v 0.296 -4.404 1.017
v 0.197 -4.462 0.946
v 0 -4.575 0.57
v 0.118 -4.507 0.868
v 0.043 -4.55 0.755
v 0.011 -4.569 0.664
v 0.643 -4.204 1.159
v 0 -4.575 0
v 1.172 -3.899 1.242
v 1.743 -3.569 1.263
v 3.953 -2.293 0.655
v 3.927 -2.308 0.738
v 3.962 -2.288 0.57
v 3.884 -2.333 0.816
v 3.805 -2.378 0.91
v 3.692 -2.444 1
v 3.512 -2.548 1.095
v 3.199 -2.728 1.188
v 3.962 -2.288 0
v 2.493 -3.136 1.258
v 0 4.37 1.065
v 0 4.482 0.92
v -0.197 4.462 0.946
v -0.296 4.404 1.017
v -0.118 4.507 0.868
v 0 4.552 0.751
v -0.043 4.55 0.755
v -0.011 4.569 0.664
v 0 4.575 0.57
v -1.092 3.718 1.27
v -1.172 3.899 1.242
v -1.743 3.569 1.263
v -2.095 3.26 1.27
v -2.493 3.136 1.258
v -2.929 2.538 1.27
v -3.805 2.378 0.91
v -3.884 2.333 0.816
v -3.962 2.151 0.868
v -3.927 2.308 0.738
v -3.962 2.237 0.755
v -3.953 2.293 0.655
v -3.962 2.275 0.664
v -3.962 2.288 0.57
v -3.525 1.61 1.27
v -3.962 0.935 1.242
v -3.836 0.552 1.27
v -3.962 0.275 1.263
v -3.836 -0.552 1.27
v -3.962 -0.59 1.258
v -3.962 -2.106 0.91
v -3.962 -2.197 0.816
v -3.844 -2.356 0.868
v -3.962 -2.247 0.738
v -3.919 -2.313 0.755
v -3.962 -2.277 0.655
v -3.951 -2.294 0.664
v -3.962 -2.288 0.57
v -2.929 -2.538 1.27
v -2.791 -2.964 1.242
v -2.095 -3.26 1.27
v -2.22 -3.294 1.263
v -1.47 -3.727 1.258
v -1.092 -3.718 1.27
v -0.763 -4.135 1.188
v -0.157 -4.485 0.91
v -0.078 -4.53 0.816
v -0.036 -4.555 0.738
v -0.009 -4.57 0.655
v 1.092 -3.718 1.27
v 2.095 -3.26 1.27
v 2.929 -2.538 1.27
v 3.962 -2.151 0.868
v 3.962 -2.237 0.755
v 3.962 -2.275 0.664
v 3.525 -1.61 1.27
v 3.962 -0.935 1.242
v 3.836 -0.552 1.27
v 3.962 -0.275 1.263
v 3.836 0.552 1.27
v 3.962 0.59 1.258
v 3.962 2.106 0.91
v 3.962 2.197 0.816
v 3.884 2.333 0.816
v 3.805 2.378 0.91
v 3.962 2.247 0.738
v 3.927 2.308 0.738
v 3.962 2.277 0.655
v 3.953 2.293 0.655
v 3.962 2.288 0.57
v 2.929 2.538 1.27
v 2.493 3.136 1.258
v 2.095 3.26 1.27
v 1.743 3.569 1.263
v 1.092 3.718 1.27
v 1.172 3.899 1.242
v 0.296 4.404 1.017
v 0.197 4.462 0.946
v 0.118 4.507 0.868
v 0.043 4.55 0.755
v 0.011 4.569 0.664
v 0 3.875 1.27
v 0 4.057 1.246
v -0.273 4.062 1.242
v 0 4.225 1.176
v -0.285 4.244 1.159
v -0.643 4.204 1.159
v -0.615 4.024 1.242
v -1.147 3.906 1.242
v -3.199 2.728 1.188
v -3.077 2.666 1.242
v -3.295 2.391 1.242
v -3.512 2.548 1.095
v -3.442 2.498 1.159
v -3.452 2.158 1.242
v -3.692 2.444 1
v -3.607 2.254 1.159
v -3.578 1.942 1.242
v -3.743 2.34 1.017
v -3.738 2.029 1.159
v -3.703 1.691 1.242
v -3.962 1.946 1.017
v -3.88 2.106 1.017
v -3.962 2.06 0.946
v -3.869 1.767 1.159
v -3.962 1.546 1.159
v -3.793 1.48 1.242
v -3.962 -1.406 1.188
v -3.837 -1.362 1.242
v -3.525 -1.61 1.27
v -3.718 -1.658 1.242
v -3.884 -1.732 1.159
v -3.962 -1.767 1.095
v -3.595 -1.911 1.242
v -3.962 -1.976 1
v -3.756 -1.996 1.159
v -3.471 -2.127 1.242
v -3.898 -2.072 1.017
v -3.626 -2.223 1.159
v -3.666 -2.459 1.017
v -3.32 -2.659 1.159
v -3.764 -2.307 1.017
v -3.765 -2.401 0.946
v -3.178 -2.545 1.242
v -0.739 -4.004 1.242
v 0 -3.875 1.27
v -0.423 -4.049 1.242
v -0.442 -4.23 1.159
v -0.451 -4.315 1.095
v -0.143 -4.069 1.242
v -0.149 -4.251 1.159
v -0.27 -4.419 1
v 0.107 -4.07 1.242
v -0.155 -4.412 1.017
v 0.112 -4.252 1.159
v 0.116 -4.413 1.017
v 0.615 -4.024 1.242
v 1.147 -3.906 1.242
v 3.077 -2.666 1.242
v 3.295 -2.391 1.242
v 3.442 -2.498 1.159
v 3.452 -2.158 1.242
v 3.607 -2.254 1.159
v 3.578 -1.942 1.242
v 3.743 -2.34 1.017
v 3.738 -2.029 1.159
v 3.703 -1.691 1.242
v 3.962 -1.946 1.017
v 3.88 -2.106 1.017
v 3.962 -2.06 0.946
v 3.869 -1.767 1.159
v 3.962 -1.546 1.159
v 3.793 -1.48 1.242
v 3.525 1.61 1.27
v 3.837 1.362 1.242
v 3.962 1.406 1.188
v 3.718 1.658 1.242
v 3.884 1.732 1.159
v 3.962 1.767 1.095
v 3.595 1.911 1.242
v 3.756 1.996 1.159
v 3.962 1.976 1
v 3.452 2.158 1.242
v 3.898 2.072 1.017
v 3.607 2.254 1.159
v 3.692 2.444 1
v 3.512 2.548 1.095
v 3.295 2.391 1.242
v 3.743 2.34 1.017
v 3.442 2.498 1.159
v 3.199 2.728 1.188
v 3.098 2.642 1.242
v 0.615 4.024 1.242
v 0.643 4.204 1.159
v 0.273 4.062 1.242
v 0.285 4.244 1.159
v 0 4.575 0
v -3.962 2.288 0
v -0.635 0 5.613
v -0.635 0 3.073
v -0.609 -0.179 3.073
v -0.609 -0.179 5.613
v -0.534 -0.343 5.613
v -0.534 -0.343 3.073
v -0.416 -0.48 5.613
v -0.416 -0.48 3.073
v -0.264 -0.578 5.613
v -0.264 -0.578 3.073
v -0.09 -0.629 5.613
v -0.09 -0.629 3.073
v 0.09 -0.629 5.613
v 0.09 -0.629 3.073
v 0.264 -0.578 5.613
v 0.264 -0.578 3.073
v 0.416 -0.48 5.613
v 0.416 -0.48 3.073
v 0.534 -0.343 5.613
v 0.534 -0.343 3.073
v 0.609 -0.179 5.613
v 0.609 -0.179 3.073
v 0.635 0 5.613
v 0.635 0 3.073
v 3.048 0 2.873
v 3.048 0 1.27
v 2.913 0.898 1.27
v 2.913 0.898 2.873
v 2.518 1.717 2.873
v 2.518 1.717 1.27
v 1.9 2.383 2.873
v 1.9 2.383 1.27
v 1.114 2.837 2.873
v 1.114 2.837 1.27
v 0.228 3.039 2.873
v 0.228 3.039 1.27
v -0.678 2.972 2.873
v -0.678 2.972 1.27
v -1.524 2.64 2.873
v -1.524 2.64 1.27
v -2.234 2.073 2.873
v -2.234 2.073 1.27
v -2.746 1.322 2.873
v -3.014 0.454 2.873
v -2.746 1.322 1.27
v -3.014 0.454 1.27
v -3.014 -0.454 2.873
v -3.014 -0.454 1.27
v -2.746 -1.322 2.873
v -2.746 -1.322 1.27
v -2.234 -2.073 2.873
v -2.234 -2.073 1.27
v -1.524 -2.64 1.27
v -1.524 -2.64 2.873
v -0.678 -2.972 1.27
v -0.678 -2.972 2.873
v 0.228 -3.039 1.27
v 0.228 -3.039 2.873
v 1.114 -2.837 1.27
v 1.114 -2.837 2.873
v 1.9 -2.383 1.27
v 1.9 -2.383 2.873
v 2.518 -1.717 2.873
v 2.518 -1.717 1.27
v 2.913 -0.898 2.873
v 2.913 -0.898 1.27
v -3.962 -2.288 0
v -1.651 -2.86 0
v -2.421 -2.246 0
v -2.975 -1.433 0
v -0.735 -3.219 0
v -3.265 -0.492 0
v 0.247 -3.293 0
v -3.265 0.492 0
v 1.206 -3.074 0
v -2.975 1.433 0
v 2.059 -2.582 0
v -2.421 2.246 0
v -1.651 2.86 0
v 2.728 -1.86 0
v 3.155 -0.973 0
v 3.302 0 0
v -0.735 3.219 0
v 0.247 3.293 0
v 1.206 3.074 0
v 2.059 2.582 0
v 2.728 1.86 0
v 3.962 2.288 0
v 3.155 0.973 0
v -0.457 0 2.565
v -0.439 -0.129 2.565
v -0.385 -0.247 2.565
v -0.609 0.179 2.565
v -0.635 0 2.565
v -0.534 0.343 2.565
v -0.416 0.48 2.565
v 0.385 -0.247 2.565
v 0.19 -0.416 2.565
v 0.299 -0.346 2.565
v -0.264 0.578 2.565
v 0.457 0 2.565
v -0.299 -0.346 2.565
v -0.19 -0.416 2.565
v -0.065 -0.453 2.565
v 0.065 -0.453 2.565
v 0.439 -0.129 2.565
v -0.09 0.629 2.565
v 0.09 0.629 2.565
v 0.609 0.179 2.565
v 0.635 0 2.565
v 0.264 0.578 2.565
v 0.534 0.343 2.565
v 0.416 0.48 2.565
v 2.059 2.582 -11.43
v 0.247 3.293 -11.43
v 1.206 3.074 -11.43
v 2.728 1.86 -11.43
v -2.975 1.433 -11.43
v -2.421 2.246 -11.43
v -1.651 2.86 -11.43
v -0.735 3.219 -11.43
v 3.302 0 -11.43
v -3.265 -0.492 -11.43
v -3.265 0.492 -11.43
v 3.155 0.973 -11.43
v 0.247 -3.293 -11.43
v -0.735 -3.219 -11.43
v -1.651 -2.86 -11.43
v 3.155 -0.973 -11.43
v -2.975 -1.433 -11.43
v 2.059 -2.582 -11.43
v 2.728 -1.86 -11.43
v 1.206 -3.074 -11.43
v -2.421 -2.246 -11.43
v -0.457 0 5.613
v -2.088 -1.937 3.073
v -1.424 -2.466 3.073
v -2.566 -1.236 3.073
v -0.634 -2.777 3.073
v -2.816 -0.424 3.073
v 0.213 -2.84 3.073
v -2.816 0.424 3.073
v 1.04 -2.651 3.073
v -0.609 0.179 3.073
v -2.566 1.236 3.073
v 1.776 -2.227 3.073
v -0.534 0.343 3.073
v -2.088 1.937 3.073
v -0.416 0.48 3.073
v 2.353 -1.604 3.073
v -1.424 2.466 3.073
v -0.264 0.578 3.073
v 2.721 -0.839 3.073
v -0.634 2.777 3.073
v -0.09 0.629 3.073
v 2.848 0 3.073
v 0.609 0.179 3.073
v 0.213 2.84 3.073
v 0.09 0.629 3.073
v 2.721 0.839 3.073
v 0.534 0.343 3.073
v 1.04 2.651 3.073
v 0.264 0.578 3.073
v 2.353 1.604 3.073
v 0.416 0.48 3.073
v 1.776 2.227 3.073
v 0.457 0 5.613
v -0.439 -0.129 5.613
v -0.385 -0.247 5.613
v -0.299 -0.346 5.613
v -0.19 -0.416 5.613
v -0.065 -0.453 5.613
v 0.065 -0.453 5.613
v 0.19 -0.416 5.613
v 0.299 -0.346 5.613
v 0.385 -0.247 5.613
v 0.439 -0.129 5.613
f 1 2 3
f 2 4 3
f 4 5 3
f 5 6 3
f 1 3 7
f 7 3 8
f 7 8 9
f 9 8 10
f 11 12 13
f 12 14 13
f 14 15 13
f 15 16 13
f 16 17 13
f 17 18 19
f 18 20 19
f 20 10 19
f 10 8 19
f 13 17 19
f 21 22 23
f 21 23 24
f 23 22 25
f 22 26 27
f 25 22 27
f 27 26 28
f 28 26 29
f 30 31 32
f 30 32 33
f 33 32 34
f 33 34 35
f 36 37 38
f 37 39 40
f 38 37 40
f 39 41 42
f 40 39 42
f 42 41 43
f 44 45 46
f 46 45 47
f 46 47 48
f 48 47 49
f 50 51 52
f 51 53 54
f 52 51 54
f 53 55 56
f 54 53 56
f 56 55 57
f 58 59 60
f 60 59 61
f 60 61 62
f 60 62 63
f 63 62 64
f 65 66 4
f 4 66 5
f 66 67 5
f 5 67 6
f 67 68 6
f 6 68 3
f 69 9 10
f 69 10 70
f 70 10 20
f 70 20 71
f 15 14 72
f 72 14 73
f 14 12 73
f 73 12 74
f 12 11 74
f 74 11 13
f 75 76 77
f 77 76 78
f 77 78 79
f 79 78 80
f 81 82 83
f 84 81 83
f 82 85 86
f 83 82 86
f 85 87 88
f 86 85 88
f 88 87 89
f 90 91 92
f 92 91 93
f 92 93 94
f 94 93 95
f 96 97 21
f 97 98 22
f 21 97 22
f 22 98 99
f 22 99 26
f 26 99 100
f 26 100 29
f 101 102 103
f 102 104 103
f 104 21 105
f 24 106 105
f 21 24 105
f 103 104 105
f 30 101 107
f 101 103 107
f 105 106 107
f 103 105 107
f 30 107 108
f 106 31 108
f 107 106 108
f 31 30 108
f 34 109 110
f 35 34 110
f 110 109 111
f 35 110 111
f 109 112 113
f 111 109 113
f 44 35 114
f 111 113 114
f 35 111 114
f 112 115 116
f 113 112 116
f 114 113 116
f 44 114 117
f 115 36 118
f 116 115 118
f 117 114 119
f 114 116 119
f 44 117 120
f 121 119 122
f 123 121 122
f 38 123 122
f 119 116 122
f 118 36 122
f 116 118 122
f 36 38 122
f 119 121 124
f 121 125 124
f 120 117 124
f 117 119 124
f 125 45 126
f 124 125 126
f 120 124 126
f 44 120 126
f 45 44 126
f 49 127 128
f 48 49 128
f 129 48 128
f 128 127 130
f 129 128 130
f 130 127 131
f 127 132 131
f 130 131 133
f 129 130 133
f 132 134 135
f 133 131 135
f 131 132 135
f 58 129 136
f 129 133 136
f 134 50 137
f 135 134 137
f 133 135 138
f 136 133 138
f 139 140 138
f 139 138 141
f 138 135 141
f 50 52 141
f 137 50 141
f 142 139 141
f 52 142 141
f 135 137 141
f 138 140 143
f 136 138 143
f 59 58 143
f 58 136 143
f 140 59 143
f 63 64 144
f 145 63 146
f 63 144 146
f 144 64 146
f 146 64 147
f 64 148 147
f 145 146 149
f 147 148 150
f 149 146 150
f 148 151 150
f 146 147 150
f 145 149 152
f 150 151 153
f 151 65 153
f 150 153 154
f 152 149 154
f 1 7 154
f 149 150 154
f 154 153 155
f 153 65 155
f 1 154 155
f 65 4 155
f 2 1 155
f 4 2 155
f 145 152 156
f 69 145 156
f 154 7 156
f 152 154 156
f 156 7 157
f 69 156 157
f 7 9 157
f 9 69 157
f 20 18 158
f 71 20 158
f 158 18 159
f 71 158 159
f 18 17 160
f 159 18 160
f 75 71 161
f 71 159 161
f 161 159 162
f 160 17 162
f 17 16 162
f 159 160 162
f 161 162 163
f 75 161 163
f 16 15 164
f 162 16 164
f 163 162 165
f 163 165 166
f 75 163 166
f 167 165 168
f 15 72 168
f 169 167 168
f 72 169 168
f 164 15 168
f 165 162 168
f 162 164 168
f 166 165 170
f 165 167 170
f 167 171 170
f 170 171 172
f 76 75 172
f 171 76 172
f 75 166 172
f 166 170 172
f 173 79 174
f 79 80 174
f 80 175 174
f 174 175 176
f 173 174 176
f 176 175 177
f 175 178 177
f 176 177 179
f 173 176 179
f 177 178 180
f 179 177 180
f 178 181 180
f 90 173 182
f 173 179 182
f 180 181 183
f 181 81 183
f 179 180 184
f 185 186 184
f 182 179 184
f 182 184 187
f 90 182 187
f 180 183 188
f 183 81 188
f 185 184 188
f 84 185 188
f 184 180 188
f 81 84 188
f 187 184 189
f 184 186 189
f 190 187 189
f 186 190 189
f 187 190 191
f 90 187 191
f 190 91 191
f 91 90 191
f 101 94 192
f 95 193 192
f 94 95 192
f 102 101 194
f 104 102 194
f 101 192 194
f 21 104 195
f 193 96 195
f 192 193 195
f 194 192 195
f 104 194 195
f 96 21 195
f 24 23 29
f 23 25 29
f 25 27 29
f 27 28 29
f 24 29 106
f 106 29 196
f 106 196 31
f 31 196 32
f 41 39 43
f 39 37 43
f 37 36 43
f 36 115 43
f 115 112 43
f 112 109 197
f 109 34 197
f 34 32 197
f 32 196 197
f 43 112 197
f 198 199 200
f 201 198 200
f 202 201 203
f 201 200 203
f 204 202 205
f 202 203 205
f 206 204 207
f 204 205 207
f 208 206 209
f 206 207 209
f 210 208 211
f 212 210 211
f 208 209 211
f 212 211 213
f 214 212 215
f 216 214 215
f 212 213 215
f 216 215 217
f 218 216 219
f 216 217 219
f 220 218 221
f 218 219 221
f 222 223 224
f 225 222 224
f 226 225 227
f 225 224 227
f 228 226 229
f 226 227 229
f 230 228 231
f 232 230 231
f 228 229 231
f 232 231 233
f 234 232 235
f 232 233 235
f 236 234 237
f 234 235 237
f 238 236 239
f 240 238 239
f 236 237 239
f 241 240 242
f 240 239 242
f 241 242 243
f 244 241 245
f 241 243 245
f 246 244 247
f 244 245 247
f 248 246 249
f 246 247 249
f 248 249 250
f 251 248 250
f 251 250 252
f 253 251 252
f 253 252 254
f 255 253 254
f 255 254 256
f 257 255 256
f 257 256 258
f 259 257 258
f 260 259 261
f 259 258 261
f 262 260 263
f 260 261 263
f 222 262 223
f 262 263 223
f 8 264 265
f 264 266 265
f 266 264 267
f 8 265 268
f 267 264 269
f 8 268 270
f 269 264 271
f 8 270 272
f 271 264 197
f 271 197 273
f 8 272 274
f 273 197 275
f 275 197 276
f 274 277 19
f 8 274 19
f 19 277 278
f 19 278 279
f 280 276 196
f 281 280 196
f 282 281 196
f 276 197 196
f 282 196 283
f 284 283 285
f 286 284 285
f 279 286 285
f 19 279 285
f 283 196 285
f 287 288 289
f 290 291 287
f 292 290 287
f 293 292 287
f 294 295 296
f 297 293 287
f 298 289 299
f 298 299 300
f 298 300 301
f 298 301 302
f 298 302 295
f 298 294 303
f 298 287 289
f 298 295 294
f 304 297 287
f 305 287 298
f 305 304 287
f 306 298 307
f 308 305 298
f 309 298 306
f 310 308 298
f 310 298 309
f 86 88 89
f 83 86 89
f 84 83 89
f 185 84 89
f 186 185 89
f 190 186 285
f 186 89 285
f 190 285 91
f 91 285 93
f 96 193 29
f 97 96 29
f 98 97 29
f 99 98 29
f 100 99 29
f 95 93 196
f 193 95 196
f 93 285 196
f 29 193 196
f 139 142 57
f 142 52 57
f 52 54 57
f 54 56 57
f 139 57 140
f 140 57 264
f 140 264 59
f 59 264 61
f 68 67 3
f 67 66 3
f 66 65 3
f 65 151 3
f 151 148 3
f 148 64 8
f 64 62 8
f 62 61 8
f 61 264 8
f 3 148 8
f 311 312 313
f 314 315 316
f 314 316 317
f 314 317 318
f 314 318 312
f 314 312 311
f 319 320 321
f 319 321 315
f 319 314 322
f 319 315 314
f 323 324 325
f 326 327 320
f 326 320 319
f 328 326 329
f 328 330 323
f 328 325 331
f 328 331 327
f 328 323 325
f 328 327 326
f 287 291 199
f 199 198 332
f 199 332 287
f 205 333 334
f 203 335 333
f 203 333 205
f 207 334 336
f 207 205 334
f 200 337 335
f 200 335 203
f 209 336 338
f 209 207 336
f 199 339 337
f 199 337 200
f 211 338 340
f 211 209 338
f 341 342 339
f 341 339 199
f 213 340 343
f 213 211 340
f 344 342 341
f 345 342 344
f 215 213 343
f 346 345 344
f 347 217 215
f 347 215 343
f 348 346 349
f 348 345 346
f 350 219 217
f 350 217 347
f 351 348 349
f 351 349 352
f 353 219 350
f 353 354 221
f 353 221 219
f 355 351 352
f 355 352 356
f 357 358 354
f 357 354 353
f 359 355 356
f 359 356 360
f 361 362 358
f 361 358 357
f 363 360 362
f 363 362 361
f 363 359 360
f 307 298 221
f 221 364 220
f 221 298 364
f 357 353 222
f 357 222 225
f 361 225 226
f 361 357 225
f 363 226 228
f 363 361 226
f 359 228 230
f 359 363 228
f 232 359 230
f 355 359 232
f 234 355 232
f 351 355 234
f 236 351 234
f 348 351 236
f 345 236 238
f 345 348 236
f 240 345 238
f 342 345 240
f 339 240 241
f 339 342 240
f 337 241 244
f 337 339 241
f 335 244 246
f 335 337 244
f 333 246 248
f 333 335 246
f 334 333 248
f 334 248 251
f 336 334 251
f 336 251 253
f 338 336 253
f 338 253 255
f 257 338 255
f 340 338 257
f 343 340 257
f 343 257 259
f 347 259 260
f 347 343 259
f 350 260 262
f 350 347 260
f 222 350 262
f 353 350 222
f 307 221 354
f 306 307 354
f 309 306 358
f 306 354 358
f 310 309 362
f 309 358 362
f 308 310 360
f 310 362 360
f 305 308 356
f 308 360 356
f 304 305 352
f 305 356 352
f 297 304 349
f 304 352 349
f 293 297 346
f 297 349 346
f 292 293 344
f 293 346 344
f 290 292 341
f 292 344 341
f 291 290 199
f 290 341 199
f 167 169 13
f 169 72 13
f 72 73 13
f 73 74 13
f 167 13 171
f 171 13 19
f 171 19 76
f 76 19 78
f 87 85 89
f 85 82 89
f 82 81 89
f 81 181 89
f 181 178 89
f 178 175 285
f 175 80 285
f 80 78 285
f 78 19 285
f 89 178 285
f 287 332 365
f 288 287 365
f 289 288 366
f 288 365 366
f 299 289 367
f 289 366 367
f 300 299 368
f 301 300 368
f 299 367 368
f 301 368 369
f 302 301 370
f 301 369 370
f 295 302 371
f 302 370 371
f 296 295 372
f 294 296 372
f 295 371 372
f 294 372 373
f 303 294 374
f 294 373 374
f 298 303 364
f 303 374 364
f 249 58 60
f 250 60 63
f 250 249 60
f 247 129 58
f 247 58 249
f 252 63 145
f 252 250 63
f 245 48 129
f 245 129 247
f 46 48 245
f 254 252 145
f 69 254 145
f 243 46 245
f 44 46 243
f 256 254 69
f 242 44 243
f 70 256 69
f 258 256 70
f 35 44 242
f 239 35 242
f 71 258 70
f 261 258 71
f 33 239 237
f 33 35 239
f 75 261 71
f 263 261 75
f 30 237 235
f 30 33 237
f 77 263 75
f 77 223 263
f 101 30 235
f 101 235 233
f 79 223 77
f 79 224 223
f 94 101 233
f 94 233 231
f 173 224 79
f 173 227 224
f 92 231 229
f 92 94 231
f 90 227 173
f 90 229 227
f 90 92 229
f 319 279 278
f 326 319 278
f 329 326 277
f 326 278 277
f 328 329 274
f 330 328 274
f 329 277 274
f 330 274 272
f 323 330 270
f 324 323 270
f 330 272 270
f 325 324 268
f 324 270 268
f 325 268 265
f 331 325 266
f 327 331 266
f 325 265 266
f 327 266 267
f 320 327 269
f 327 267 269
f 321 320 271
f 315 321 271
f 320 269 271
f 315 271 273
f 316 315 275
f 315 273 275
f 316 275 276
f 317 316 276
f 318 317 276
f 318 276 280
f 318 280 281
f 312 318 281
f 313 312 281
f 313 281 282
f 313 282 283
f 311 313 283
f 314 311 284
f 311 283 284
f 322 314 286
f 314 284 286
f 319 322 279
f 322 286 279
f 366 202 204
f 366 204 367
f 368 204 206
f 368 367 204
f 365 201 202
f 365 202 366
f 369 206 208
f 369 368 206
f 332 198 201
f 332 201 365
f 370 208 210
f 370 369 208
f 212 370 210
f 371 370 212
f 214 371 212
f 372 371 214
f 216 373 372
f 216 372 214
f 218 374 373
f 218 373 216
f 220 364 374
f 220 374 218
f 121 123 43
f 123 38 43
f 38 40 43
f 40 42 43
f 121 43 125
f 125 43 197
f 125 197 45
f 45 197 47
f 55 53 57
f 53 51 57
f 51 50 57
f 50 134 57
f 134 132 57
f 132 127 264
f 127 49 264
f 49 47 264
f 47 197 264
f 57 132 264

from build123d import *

# Parameters (mm, degrees)
F2_DEPTH  = 1.27
F5_R      = 3.048
F6_DEPTH  = 1.8034
F7_SIZE   = 0.2
F8_R      = 0.635
F9_DEPTH  = 2.54
F11_DEPTH = 3.048
F12_R     = 3.302
F13_DEPTH = 11.43


with BuildPart() as f2:
    # F1 (on Top) → F2 (new body)
    with BuildSketch(Plane.XY):
        Polygon((3.9624, 2.2876927066), (0, 4.5753854133), (-3.9624, 2.2876927066), (-3.9624, -2.2876927066), (0, -4.5753854133), (3.9624, -2.2876927066), align=None)
    extrude(amount=F2_DEPTH)

    # F3 (on Right) → F4 (revolve, cut)
    with BuildSketch(Plane.YZ):
        with BuildLine():
            ThreePointArc((3.8753854133, 1.27), (4.3703601601, 1.0649747468), (4.5753854133, 0.57))
            Line((4.5753854133, 0.57), (4.5753854133, 1.27))
            Line((4.5753854133, 1.27), (3.8753854133, 1.27))
        make_face()
    revolve(axis=Axis((0, 0, -1.1243047193), (0, 0, 1)), mode=Mode.SUBTRACT)

    # F5 (on face) → F6 (join)
    with BuildSketch(Plane.XY.offset(1.27)):
        Circle(F5_R)
    extrude(amount=F6_DEPTH)

    # F7
    f7_edges = [f2.edges().sort_by_distance(p)[0] for p in [
        (-3.048, 0, 3.0734),
    ]]
    chamfer(f7_edges, length=F7_SIZE)

    # F8 (on face) → F9 (join)
    with BuildSketch(Plane.XY.offset(3.0734)):
        Circle(F8_R)
    extrude(amount=F9_DEPTH)

    # F10 (on face) → F11 (cut)
    with BuildSketch(Plane.XY.offset(5.6134)):
        with BuildLine():
            Line((-0.635, 0), (-0.4572, 0))
            ThreePointArc((-0.4572, 0), (0, -0.4572), (0.4572, 0))
            Line((0.4572, 0), (0.635, 0))
            ThreePointArc((0.635, 0), (0, 0.635), (-0.635, 0))
        make_face()
    extrude(amount=-F11_DEPTH, mode=Mode.SUBTRACT)

    # F12 (on face) → F13 (join)
    with BuildSketch(Plane(origin=(0, 0, 0), x_dir=(1, 0, 0), z_dir=(0, 0, -1))):
        Circle(F12_R)
    extrude(amount=F13_DEPTH)


solid = f2.part
